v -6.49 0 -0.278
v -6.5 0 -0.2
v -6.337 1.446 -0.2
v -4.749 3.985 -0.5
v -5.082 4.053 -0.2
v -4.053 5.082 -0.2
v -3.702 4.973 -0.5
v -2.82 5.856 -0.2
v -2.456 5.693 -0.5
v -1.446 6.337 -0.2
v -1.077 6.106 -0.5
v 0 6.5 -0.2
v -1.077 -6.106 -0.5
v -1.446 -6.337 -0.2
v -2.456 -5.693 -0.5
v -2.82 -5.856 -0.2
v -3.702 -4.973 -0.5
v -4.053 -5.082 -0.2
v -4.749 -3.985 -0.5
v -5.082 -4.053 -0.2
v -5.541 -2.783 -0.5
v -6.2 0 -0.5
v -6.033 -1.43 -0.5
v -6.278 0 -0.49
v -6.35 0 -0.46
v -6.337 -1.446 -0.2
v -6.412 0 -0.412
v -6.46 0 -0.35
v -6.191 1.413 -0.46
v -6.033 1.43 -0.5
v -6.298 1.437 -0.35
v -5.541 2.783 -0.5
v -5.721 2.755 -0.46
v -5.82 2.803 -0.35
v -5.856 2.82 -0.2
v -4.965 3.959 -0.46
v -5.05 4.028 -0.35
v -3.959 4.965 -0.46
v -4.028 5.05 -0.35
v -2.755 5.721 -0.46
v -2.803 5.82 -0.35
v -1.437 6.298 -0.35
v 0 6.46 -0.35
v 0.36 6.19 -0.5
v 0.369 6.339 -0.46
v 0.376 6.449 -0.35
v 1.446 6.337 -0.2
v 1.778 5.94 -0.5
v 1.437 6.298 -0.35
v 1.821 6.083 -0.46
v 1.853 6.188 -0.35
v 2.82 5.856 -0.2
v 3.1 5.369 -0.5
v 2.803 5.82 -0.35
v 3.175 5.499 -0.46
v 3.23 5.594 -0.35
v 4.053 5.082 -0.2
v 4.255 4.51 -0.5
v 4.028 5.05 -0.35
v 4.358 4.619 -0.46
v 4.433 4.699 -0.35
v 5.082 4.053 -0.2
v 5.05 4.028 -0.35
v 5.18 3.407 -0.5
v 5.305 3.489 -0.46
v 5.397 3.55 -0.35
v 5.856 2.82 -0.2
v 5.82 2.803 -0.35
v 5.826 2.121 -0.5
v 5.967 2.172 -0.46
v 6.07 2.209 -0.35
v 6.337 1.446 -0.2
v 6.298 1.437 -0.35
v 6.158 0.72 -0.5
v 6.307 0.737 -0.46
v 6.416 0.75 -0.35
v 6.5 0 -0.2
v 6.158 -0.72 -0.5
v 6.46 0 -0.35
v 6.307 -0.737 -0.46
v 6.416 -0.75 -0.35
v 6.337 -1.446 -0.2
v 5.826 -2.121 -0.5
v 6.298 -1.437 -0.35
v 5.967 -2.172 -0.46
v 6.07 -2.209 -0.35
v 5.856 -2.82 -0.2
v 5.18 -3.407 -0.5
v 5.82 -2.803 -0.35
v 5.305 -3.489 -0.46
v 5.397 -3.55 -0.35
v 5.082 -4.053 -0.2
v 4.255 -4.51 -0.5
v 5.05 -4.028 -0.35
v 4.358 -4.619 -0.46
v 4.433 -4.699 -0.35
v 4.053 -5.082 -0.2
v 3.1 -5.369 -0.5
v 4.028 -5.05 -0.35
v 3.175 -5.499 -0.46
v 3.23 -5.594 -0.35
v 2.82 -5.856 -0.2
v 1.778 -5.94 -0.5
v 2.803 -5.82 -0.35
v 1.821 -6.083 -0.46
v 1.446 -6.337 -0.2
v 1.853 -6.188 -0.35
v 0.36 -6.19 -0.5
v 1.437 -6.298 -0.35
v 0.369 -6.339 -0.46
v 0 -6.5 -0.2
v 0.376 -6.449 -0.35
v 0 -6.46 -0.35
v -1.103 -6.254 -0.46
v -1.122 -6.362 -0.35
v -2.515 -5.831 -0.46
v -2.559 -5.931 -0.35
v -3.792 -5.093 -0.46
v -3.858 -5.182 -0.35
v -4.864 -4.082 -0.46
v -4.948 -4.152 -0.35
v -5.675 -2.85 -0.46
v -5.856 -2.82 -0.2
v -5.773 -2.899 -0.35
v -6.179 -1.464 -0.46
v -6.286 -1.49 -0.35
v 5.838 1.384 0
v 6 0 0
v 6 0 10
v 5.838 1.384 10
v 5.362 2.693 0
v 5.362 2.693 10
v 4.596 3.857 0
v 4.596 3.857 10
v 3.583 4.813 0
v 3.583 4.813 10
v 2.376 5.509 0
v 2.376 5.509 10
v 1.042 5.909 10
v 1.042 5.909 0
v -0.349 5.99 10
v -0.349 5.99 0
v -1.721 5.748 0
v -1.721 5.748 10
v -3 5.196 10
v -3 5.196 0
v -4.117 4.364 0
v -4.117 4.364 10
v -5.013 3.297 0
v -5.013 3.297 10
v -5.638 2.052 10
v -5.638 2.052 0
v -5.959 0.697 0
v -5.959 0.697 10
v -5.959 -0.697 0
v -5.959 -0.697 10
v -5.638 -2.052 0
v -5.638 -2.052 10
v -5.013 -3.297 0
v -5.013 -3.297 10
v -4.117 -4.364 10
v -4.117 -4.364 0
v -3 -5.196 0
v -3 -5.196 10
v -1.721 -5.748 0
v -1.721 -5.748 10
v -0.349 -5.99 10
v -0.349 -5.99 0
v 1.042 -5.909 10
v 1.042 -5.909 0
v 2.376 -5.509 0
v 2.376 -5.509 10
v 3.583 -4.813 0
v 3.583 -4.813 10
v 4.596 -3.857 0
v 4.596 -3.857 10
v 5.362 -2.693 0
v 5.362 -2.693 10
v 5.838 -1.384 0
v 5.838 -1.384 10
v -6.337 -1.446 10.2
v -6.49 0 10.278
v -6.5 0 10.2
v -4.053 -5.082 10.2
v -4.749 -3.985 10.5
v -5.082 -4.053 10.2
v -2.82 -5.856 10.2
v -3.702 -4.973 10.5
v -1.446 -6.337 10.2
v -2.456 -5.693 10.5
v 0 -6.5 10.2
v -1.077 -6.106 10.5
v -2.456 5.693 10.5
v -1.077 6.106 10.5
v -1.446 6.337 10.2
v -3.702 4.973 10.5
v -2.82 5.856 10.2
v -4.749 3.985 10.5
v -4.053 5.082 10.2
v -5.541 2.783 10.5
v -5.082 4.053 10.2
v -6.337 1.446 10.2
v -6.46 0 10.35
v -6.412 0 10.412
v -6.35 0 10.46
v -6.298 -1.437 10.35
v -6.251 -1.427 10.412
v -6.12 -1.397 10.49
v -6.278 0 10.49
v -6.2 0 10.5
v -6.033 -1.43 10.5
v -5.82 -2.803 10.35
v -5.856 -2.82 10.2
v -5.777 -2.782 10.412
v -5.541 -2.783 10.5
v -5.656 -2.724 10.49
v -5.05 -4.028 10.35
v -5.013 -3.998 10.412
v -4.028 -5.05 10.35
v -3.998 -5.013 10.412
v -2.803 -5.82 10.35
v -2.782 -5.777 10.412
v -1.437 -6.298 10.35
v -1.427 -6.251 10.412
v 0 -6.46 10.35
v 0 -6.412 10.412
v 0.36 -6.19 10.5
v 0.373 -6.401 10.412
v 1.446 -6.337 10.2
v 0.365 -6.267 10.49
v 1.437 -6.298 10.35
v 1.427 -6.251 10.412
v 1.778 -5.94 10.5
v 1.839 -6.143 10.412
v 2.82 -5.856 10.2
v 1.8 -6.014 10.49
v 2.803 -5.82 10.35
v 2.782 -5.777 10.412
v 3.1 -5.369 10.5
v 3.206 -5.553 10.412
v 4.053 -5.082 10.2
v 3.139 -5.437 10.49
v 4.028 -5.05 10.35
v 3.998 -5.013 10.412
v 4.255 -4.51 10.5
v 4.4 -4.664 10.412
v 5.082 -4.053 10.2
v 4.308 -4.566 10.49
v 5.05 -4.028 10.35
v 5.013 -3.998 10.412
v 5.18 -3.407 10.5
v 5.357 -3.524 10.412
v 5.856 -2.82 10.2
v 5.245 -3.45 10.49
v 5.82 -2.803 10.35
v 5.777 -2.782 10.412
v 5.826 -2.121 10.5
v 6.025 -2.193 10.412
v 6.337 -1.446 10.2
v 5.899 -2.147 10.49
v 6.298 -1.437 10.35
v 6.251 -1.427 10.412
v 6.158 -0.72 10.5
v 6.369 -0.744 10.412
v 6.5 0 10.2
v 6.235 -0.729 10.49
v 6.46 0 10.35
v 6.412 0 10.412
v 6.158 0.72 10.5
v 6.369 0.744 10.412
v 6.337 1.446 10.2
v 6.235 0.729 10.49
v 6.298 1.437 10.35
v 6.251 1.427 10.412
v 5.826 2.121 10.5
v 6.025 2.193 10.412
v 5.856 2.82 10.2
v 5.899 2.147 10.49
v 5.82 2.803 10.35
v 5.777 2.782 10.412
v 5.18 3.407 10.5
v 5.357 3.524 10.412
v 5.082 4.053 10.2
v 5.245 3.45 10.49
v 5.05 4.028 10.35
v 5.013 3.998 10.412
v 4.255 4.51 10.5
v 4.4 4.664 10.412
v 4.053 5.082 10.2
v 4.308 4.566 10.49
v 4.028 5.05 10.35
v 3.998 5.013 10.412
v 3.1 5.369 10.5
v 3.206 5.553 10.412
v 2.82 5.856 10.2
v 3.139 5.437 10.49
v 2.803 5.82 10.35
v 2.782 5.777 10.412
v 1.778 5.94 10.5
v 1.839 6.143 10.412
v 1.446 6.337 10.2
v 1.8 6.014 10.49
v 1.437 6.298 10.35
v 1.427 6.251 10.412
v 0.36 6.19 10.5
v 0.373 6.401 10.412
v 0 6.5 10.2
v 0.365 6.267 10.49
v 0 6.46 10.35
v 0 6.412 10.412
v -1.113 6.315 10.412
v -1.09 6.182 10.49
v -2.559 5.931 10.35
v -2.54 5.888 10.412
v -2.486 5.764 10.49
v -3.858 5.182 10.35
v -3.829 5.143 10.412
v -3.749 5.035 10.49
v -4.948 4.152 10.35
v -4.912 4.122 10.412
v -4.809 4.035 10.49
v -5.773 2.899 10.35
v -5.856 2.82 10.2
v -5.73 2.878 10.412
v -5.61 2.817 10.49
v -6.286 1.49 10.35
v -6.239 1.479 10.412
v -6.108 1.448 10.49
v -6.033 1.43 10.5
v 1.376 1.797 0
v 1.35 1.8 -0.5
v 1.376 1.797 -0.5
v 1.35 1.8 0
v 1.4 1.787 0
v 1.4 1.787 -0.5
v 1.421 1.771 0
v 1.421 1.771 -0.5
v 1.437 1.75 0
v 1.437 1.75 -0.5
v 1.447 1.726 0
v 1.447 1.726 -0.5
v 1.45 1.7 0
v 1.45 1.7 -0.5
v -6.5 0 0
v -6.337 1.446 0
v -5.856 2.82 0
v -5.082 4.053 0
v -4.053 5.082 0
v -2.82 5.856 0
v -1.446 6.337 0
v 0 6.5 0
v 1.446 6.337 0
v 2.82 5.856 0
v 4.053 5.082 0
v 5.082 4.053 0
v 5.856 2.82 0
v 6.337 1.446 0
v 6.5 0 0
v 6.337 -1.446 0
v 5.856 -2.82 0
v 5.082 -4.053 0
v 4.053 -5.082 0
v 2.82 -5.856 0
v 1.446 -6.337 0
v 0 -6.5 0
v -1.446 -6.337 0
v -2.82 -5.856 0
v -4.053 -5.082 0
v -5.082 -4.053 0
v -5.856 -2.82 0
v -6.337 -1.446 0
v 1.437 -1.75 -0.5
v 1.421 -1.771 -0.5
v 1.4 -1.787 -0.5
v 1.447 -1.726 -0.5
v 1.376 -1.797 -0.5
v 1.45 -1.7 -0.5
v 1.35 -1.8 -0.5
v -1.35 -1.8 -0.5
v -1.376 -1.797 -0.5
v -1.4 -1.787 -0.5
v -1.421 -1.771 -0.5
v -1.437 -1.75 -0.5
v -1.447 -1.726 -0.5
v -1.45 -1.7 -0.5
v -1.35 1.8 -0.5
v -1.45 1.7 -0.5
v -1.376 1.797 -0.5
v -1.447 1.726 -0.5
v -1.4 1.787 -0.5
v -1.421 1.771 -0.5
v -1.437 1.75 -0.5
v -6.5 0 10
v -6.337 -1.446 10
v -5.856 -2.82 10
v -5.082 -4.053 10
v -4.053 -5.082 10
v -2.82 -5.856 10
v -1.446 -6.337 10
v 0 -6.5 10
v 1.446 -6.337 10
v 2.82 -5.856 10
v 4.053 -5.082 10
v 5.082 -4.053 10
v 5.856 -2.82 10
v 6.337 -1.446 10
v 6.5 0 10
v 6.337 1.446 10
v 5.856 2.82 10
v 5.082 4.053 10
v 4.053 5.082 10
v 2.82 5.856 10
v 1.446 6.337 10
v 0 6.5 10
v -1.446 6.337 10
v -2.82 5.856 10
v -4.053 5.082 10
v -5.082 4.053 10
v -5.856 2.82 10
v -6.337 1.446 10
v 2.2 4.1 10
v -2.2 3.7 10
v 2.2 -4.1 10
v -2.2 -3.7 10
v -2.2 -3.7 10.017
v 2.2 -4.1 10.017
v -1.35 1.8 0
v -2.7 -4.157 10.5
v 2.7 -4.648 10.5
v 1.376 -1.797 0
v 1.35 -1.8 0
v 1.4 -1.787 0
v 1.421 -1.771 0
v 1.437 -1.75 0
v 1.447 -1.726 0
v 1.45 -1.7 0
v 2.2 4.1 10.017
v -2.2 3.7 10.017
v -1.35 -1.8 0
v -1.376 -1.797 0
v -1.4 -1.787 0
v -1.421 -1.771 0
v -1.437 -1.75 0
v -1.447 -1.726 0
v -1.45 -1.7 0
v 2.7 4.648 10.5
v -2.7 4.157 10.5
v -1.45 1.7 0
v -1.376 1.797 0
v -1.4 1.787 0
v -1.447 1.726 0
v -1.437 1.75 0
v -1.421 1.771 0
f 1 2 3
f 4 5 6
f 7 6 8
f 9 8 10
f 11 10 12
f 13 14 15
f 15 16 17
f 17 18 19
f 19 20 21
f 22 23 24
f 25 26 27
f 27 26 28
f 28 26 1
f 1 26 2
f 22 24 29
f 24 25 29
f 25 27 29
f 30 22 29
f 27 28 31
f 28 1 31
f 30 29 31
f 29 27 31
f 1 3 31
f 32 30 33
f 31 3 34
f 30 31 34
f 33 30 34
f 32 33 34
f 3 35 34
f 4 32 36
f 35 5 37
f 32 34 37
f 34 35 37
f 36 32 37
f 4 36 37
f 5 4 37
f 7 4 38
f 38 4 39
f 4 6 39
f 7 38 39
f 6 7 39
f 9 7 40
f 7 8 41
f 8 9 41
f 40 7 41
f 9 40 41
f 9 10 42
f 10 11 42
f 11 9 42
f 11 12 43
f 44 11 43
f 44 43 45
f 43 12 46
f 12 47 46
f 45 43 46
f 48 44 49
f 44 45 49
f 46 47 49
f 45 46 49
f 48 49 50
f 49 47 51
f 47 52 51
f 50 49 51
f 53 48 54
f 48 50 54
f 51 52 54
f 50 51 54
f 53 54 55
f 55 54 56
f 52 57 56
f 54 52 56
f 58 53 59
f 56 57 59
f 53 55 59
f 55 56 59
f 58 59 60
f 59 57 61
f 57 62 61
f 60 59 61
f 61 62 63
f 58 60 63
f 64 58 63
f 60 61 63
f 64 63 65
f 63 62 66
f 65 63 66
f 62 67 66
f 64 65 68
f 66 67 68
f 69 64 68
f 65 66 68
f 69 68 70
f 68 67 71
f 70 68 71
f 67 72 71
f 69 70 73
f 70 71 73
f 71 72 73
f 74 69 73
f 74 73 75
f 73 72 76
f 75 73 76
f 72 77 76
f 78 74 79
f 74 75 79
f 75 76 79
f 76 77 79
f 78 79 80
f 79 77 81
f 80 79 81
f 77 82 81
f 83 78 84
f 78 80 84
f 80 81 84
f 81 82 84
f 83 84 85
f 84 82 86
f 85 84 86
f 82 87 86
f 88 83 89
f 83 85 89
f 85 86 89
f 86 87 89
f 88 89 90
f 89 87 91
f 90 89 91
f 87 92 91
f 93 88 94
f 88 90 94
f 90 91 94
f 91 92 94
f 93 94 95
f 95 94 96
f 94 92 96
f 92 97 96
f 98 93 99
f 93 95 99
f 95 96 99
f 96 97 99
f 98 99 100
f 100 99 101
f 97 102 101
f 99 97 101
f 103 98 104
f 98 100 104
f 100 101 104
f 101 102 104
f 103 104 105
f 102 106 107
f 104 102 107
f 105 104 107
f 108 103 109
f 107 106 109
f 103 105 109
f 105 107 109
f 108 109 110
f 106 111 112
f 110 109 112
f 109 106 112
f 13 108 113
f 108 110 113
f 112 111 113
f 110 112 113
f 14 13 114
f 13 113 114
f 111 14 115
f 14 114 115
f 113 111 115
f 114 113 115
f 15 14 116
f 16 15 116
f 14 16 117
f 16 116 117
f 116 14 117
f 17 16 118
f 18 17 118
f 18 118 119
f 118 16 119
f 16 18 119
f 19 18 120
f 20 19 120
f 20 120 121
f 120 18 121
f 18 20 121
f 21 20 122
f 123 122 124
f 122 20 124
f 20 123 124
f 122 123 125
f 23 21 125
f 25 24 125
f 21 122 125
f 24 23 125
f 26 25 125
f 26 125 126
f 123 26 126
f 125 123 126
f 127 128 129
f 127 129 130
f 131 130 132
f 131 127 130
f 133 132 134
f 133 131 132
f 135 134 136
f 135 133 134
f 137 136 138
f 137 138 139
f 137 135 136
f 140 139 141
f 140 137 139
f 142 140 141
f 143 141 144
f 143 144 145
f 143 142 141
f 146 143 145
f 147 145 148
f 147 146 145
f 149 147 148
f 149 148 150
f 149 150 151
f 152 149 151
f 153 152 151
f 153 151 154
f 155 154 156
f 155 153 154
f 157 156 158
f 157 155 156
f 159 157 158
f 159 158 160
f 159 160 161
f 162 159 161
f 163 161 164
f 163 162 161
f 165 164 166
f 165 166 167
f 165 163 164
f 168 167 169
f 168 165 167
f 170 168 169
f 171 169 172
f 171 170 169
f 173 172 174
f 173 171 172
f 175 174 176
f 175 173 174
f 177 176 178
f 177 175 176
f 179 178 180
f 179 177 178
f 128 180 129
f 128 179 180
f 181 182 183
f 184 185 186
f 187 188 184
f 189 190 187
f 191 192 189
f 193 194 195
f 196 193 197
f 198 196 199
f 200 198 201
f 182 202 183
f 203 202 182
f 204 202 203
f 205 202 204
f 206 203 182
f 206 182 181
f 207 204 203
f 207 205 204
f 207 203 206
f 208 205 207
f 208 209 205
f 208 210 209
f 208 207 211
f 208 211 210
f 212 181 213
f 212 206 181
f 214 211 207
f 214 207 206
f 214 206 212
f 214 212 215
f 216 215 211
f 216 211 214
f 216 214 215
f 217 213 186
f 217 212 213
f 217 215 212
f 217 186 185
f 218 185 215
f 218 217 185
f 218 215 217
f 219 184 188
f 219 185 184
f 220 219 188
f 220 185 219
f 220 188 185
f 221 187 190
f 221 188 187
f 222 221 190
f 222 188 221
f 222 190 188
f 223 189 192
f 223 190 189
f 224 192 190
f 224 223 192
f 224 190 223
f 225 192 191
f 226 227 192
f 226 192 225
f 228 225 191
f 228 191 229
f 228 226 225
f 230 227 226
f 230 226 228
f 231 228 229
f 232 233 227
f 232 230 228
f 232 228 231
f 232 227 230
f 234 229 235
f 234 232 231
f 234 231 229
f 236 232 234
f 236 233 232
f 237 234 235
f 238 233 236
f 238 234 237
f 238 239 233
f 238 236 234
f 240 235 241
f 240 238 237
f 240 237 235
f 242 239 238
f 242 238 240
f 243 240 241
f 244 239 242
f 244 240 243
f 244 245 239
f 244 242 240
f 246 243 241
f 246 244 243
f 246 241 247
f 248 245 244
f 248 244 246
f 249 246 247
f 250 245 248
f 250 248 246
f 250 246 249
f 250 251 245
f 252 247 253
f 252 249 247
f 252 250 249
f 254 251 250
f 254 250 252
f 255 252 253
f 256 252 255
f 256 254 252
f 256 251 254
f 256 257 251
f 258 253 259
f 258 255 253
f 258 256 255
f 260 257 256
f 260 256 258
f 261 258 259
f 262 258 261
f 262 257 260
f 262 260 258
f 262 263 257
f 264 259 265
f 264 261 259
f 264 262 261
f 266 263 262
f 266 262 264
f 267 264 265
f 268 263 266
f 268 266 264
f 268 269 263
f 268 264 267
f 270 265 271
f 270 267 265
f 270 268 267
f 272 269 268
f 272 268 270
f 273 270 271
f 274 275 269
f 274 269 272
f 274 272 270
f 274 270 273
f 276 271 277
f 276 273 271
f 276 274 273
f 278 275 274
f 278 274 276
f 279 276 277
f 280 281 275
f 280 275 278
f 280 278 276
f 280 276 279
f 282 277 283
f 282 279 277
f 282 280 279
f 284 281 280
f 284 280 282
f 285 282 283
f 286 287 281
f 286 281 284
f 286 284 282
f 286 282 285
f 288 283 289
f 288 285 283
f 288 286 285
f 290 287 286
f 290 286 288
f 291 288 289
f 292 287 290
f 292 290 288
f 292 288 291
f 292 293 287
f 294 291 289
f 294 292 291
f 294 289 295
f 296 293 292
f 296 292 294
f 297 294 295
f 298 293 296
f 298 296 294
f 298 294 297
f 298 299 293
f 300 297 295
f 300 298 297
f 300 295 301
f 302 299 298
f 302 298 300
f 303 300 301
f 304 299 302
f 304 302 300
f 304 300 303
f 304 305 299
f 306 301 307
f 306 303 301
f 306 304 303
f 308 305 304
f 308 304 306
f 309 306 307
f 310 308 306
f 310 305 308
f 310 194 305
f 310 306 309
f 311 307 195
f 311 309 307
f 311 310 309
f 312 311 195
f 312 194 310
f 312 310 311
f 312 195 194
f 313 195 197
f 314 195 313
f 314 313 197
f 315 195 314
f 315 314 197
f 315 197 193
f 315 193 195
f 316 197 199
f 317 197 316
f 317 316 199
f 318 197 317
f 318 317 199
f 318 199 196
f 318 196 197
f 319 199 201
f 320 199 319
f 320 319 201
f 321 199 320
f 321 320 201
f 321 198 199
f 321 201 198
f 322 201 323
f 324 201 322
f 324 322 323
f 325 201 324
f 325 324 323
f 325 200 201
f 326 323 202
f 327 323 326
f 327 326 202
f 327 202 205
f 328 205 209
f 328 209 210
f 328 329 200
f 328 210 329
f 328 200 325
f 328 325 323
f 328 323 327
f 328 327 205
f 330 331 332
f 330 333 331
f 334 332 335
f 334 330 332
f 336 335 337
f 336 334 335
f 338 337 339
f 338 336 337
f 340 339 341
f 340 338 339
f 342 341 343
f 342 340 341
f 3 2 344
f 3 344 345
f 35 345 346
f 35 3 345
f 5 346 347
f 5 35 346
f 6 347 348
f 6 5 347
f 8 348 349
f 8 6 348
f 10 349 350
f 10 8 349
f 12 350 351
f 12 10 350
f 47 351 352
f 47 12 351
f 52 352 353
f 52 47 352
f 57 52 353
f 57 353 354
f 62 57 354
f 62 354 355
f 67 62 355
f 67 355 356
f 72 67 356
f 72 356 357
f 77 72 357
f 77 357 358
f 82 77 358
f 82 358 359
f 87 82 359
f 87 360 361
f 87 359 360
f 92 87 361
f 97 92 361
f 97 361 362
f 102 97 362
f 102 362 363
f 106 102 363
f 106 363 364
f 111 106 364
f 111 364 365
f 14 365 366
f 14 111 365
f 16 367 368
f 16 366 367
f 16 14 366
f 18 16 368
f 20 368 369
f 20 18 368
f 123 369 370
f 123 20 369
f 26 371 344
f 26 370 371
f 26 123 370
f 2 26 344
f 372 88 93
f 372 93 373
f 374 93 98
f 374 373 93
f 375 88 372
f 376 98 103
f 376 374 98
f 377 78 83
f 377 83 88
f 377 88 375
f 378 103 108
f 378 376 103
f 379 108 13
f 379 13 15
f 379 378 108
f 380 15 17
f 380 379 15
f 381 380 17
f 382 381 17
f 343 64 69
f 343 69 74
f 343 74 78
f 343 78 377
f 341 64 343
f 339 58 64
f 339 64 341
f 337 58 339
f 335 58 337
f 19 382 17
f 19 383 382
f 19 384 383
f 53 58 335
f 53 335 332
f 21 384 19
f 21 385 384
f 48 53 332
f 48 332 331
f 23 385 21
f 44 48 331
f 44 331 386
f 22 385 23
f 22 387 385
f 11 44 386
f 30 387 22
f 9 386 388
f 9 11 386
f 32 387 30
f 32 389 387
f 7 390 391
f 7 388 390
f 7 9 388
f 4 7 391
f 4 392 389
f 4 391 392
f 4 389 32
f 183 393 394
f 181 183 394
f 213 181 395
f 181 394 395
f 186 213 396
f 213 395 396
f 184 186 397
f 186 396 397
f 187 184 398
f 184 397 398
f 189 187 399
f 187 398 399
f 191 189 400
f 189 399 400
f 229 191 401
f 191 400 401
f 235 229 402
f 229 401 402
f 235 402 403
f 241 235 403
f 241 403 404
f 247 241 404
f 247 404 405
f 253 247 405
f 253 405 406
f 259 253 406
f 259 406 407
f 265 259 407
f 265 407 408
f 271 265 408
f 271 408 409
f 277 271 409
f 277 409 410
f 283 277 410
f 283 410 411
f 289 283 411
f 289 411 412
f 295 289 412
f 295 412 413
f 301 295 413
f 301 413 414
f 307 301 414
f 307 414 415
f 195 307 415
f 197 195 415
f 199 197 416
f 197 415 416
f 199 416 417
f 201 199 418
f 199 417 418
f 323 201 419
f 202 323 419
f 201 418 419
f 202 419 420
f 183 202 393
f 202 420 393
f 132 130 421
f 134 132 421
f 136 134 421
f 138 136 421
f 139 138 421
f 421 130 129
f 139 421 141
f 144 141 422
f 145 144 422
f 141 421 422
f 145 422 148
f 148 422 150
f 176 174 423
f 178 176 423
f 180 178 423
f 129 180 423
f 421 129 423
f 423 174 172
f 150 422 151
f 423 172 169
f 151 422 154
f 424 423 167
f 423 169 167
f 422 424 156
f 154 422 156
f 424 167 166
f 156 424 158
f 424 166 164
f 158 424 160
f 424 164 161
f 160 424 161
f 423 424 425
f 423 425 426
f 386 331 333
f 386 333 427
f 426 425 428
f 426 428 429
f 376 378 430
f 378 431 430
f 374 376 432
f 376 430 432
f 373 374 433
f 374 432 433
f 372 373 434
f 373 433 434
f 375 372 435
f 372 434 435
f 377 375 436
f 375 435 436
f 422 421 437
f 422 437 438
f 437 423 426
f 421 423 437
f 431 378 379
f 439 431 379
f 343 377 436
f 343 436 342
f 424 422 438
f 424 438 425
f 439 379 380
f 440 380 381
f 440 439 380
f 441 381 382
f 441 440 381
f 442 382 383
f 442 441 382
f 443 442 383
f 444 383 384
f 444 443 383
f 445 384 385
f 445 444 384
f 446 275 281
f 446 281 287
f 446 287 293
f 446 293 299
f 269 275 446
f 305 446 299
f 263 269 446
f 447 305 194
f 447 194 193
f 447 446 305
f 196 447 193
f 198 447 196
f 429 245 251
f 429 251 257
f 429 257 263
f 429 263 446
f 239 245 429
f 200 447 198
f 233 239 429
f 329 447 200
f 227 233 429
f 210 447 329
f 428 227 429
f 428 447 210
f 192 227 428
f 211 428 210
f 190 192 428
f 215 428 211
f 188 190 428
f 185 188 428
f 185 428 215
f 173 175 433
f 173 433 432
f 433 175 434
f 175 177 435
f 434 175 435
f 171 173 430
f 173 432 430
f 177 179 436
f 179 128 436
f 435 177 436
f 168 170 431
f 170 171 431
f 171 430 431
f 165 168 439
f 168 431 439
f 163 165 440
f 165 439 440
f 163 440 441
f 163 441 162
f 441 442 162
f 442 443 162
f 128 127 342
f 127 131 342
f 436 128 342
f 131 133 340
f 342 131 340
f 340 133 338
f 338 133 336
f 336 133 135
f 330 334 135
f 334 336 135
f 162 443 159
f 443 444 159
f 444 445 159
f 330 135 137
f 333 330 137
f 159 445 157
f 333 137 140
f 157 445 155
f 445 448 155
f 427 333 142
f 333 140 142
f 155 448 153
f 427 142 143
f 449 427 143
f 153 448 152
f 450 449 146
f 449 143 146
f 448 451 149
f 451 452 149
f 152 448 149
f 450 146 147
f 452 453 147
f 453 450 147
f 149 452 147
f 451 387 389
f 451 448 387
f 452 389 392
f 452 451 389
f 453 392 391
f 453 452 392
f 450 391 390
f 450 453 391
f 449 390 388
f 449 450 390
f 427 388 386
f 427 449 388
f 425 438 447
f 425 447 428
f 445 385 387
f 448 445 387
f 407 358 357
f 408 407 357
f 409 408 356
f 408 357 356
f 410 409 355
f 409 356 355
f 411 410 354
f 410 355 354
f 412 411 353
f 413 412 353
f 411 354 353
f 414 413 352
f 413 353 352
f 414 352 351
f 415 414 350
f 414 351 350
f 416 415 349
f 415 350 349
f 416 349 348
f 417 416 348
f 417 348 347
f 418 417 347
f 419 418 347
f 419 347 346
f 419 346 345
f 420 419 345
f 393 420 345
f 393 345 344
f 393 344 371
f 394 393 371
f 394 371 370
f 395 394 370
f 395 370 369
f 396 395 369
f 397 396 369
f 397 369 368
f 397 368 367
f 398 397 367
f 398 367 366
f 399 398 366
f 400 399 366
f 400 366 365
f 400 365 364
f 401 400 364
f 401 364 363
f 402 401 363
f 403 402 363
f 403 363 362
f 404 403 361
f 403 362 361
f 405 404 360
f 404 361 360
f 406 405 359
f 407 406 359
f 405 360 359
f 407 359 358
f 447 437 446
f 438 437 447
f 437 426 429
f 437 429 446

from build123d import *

# Parameters (mm, degrees)
SKETCH1_R           = 6.5
SKETCH1_R_2         = 6
BOSS_EXTRUDE1_DEPTH = 10
BOSS_EXTRUDE2_START = 0.5
SKETCH2_R           = 6.5
BOSS_EXTRUDE2_DEPTH = 0.5
SKETCH3_R           = 6.5
BOSS_EXTRUDE3_DEPTH = 0.5
CHAMFER1_SIZE       = 0.5
CHAMFER1_SIZE2      = 0.482844387
SKETCH4_W           = 2.9
SKETCH4_H           = 3.6
CUT_EXTRUDE1_DEPTH  = 1
FILLET1_R           = 0.1
FILLET2_R           = 0.3


with BuildPart() as part:
    # Sketch1 → Boss-Extrude1 (new body)
    with BuildSketch(Plane.XY):
        Circle(SKETCH1_R)
        Circle(SKETCH1_R_2, mode=Mode.SUBTRACT)
    extrude(amount=BOSS_EXTRUDE1_DEPTH)

    # Sketch2 → Boss-Extrude2 (add)
    with BuildSketch(Plane(origin=(0, 0, 0), x_dir=(-1, 0, 0), z_dir=(0, 0, -1)).offset(BOSS_EXTRUDE2_START)):
        Circle(SKETCH2_R)
    extrude(amount=-BOSS_EXTRUDE2_DEPTH)

    # Sketch3 → Boss-Extrude3 (add)
    with BuildSketch(Plane.XY.offset(10)):
        with Locations(Location((0, 0, 0), (0, 0, 180))):
            Circle(SKETCH3_R)
        Polygon((-2.2, 3.7), (-2.2, -3.7), (2.2, -4.1), (2.2, 4.1), align=None, mode=Mode.SUBTRACT)
    extrude(amount=BOSS_EXTRUDE3_DEPTH)

    # Chamfer1
    chamfer1_edges = [part.edges().sort_by_distance(p)[0] for p in [
        (0, -3.9, 10.5),
        (2.2, 0, 10.5),
        (0, 3.9, 10.5),
        (-2.2, 0, 10.5),
    ]]
    chamfer1_side = [part.faces().sort_by_distance(p)[0] for p in [
        (6.316152237, 0, 10.5),
    ]]
    chamfer(chamfer1_edges, length=CHAMFER1_SIZE, length2=CHAMFER1_SIZE2, reference=chamfer1_side[0])

    # Sketch4 → Cut-Extrude1 (cut)
    with BuildSketch(Plane(origin=(0, 0, -0.5), x_dir=(-1, 0, 0), z_dir=(0, 0, -1))):
        Rectangle(SKETCH4_W, SKETCH4_H)
    extrude(amount=-CUT_EXTRUDE1_DEPTH, mode=Mode.SUBTRACT)

    # Fillet1
    fillet1_edges = [part.edges().sort_by_distance(p)[0] for p in [
        (-1.45, 1.8, -0.25),
        (-1.45, -1.8, -0.25),
        (1.45, -1.8, -0.25),
        (1.45, 1.8, -0.25),
    ]]
    fillet(fillet1_edges, radius=FILLET1_R)

    # Fillet2
    fillet2_edges = [part.edges().sort_by_distance(p)[0] for p in [
        (6.5, 0, -0.5),
        (6.5, 0, 10.5),
    ]]
    fillet(fillet2_edges, radius=FILLET2_R)


solid = part.part
